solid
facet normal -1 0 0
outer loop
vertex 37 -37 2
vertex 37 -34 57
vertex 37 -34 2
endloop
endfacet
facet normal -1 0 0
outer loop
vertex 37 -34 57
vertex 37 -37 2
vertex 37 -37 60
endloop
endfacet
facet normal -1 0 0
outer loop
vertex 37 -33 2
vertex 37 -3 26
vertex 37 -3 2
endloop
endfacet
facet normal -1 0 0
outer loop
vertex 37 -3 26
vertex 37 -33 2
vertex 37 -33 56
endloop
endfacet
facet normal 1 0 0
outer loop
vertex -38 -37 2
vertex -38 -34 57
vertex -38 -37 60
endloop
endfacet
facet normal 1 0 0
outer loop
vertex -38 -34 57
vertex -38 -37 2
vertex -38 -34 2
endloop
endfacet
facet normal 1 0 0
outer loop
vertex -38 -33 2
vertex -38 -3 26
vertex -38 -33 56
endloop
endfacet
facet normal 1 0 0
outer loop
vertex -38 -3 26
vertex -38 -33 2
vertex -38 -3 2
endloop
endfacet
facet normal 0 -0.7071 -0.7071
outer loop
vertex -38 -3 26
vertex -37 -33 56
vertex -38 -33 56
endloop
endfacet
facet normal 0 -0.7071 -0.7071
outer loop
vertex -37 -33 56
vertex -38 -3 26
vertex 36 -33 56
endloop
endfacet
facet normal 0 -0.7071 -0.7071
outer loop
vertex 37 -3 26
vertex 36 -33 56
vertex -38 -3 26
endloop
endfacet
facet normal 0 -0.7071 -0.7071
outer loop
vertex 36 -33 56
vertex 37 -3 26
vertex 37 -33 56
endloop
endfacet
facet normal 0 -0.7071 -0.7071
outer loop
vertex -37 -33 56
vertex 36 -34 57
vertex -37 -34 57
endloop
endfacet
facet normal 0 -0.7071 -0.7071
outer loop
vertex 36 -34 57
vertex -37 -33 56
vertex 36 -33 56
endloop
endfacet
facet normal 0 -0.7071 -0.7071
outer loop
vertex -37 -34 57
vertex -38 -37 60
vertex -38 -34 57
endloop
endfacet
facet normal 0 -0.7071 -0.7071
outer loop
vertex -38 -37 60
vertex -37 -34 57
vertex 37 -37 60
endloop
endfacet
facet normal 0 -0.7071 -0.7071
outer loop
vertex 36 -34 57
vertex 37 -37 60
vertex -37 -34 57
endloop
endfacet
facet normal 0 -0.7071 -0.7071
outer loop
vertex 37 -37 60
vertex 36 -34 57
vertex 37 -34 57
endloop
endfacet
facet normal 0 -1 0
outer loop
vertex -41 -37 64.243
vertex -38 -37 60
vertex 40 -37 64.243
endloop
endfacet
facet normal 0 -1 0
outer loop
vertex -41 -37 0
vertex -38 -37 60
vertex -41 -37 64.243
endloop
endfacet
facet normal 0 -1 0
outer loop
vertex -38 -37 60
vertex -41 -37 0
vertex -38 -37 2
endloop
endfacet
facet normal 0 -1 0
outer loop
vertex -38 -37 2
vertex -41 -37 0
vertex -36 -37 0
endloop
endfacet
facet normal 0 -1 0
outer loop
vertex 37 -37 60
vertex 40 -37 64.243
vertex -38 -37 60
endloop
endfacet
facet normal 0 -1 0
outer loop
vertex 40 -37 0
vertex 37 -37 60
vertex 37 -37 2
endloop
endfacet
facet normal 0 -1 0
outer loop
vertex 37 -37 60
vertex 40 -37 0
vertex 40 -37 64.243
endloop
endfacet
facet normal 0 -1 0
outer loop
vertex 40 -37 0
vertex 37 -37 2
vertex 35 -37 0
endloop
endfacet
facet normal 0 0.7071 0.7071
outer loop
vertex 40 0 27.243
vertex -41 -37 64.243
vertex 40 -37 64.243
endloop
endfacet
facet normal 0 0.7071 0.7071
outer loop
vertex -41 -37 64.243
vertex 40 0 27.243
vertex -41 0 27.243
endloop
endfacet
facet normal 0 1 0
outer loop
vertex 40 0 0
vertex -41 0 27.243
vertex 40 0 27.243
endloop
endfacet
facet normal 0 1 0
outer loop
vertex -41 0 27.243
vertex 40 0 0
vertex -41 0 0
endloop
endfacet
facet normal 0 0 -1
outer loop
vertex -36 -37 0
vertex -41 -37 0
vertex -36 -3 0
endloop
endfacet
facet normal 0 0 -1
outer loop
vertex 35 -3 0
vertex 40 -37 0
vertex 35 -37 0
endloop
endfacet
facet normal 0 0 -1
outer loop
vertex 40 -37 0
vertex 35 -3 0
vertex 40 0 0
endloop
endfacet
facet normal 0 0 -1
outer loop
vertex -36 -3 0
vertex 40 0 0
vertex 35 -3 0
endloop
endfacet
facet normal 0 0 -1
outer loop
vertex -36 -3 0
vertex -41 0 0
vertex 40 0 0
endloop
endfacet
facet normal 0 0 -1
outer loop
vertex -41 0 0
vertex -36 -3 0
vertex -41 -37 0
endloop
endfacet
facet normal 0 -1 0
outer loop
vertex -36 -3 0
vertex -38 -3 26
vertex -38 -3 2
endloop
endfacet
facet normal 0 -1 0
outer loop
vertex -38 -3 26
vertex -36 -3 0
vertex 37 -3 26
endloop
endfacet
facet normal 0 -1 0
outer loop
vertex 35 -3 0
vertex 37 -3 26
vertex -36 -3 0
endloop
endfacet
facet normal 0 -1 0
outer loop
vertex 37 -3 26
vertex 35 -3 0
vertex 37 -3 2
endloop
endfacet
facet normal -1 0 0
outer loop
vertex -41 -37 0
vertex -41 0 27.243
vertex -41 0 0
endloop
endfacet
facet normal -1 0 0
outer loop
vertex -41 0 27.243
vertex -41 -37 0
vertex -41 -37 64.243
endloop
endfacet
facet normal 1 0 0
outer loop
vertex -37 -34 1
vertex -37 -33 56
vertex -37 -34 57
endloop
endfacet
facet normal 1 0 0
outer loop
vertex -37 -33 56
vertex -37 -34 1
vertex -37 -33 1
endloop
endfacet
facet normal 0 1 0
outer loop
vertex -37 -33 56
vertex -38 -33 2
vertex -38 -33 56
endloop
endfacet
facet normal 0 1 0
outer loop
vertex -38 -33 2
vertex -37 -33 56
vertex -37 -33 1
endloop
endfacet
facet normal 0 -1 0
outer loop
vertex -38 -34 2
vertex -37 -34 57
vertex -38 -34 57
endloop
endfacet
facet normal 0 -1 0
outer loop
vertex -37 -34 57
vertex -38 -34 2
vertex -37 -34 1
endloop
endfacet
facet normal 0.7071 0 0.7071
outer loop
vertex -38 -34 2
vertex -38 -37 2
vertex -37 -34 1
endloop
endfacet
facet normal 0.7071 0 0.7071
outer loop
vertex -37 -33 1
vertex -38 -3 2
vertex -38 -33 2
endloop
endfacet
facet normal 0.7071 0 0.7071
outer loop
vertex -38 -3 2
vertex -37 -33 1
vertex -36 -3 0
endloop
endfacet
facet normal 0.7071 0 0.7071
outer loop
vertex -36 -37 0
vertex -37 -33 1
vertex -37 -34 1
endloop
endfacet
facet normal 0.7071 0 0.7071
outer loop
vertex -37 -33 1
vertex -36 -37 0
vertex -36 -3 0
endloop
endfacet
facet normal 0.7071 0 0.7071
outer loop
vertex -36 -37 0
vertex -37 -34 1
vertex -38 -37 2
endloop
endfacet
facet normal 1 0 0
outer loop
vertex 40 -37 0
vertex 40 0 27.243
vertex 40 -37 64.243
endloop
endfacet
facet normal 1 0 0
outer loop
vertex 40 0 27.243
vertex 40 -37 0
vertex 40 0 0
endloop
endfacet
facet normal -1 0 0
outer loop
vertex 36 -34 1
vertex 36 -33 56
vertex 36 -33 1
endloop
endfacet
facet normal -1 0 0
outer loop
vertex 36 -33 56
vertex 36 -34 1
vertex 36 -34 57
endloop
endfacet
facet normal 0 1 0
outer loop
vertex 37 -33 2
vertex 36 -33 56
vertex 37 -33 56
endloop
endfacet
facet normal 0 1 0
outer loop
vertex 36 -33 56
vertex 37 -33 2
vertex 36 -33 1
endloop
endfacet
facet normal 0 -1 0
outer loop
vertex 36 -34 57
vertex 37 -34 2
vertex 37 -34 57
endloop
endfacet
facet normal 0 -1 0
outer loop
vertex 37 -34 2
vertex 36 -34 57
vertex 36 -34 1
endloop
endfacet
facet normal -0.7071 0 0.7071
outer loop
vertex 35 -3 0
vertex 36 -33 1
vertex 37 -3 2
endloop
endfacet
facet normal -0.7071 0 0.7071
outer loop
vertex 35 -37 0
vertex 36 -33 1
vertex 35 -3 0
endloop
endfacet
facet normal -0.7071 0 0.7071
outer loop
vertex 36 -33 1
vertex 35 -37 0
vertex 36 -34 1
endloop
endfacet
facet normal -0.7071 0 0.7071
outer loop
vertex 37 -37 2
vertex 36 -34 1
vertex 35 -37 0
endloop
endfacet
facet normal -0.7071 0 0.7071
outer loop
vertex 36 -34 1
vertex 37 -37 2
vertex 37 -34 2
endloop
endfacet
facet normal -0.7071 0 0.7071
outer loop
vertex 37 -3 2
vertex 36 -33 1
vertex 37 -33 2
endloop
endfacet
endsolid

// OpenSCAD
// back and roof
translate([37,0,00])
rotate([90,0,-90])
linear_extrude(height=75) // 73 frame length + 1mm each side
polygon([
 [0,0],
 [0,23+3*sqrt(2)],
 [37,37+23+3*sqrt(2)],
 [37,37+23],
 [3,26],
 [3,0]
]);

// left
translate([-38,0,0])
side();

translate([-38,-34,0])
cube([1,1,60]);

translate([-38,-3,0])
rotate([90,0,0])
scale([2,2,34])
skirt();

// right
translate([40,0,0])
side();

translate([36,-34,0])
cube([1,1,60]);

translate([37,-3,0])
rotate([90,0,0])
scale([-2,2,34])
skirt();


module side() {
 rotate([90,0,-90])
 linear_extrude(height=3)
 polygon([
  [0,0],
  [0,23+3*sqrt(2)],
  [37,37+23+3*sqrt(2)],
  [37,0]
 ]);
}

module skirt() {
 linear_extrude(height=1)
 polygon([
  [0,0],
  [0,1],
  [1,0]
 ]);
}
